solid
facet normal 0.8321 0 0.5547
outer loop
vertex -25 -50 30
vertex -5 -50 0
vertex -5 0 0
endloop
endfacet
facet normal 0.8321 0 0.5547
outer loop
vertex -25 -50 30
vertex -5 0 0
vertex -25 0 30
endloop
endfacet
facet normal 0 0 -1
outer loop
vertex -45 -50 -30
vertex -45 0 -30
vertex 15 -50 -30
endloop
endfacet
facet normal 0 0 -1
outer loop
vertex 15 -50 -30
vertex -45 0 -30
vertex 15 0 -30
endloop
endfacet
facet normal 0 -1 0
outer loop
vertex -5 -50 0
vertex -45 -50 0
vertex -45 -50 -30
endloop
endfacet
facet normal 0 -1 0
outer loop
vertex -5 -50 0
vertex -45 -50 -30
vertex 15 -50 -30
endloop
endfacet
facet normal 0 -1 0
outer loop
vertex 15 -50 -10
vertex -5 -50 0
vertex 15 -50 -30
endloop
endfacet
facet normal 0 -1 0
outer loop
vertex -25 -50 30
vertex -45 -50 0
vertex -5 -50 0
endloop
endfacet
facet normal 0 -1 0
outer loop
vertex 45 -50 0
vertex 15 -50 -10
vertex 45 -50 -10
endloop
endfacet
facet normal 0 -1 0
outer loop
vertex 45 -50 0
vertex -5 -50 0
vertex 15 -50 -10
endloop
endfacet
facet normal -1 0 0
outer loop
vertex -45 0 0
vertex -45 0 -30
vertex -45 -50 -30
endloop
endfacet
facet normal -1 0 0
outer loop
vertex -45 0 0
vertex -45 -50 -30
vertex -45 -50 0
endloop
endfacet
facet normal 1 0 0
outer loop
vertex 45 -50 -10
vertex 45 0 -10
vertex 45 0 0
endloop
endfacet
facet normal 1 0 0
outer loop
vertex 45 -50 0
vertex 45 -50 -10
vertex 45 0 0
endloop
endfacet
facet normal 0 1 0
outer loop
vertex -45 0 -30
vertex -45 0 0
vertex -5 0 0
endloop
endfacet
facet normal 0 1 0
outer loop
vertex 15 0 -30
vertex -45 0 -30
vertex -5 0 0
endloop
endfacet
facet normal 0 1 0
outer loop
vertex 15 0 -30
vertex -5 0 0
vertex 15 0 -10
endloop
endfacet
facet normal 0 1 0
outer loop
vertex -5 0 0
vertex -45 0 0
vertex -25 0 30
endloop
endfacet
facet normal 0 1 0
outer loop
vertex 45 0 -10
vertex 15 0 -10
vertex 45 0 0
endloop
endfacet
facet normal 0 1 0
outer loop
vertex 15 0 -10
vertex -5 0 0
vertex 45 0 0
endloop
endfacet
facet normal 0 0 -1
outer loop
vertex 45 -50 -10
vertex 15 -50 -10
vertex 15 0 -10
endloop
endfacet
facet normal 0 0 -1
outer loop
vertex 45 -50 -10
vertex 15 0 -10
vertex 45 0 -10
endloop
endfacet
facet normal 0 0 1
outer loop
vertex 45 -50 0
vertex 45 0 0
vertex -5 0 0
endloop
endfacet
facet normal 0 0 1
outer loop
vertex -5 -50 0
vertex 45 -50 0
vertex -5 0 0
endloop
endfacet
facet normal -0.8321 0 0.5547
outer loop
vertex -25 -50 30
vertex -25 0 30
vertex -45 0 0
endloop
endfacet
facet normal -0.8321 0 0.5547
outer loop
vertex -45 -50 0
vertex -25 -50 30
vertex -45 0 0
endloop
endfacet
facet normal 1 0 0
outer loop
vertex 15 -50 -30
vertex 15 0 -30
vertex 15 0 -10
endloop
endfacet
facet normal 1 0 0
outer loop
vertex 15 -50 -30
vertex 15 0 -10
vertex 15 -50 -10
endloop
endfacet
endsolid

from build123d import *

# Parameters (mm, degrees)
F0_W     = 90
F0_H     = 60
F1_DEPTH = 50
F2_W     = 30
F2_H     = 50
F3_DEPTH = 20
F5_DEPTH = 50.001
F6_DEPTH = 50.001


with BuildPart() as f1:
    # F0 (on Front) → F1 (new body)
    with BuildSketch(Plane.XZ):
        Rectangle(F0_W, F0_H)
    extrude(amount=F1_DEPTH)

    # F2 (on face) → F3 (cut)
    with BuildSketch(Plane(origin=(0, 0, -30), x_dir=(1, 0, 0), z_dir=(0, 0, -1))):
        with Locations((30, 25)):
            Rectangle(F2_W, F2_H)
    extrude(amount=-F3_DEPTH, mode=Mode.SUBTRACT)

    # F4 (on face) → F5 (cut, through all)
    with BuildSketch(Plane(origin=(0, 0, 0), x_dir=(-1, 0, 0), z_dir=(0, 1, 0))):
        Polygon((45, 30), (25, 30), (45, 0), align=None)
    extrude(amount=-F5_DEPTH, mode=Mode.SUBTRACT)

    # F4 (on face) → F6 (cut, through all)
    with BuildSketch(Plane(origin=(0, 0, 0), x_dir=(-1, 0, 0), z_dir=(0, 1, 0))):
        Polygon((-45, 30), (-45, 0), (5, 0), (25, 30), align=None)
    extrude(amount=-F6_DEPTH, mode=Mode.SUBTRACT)


solid = f1.part
